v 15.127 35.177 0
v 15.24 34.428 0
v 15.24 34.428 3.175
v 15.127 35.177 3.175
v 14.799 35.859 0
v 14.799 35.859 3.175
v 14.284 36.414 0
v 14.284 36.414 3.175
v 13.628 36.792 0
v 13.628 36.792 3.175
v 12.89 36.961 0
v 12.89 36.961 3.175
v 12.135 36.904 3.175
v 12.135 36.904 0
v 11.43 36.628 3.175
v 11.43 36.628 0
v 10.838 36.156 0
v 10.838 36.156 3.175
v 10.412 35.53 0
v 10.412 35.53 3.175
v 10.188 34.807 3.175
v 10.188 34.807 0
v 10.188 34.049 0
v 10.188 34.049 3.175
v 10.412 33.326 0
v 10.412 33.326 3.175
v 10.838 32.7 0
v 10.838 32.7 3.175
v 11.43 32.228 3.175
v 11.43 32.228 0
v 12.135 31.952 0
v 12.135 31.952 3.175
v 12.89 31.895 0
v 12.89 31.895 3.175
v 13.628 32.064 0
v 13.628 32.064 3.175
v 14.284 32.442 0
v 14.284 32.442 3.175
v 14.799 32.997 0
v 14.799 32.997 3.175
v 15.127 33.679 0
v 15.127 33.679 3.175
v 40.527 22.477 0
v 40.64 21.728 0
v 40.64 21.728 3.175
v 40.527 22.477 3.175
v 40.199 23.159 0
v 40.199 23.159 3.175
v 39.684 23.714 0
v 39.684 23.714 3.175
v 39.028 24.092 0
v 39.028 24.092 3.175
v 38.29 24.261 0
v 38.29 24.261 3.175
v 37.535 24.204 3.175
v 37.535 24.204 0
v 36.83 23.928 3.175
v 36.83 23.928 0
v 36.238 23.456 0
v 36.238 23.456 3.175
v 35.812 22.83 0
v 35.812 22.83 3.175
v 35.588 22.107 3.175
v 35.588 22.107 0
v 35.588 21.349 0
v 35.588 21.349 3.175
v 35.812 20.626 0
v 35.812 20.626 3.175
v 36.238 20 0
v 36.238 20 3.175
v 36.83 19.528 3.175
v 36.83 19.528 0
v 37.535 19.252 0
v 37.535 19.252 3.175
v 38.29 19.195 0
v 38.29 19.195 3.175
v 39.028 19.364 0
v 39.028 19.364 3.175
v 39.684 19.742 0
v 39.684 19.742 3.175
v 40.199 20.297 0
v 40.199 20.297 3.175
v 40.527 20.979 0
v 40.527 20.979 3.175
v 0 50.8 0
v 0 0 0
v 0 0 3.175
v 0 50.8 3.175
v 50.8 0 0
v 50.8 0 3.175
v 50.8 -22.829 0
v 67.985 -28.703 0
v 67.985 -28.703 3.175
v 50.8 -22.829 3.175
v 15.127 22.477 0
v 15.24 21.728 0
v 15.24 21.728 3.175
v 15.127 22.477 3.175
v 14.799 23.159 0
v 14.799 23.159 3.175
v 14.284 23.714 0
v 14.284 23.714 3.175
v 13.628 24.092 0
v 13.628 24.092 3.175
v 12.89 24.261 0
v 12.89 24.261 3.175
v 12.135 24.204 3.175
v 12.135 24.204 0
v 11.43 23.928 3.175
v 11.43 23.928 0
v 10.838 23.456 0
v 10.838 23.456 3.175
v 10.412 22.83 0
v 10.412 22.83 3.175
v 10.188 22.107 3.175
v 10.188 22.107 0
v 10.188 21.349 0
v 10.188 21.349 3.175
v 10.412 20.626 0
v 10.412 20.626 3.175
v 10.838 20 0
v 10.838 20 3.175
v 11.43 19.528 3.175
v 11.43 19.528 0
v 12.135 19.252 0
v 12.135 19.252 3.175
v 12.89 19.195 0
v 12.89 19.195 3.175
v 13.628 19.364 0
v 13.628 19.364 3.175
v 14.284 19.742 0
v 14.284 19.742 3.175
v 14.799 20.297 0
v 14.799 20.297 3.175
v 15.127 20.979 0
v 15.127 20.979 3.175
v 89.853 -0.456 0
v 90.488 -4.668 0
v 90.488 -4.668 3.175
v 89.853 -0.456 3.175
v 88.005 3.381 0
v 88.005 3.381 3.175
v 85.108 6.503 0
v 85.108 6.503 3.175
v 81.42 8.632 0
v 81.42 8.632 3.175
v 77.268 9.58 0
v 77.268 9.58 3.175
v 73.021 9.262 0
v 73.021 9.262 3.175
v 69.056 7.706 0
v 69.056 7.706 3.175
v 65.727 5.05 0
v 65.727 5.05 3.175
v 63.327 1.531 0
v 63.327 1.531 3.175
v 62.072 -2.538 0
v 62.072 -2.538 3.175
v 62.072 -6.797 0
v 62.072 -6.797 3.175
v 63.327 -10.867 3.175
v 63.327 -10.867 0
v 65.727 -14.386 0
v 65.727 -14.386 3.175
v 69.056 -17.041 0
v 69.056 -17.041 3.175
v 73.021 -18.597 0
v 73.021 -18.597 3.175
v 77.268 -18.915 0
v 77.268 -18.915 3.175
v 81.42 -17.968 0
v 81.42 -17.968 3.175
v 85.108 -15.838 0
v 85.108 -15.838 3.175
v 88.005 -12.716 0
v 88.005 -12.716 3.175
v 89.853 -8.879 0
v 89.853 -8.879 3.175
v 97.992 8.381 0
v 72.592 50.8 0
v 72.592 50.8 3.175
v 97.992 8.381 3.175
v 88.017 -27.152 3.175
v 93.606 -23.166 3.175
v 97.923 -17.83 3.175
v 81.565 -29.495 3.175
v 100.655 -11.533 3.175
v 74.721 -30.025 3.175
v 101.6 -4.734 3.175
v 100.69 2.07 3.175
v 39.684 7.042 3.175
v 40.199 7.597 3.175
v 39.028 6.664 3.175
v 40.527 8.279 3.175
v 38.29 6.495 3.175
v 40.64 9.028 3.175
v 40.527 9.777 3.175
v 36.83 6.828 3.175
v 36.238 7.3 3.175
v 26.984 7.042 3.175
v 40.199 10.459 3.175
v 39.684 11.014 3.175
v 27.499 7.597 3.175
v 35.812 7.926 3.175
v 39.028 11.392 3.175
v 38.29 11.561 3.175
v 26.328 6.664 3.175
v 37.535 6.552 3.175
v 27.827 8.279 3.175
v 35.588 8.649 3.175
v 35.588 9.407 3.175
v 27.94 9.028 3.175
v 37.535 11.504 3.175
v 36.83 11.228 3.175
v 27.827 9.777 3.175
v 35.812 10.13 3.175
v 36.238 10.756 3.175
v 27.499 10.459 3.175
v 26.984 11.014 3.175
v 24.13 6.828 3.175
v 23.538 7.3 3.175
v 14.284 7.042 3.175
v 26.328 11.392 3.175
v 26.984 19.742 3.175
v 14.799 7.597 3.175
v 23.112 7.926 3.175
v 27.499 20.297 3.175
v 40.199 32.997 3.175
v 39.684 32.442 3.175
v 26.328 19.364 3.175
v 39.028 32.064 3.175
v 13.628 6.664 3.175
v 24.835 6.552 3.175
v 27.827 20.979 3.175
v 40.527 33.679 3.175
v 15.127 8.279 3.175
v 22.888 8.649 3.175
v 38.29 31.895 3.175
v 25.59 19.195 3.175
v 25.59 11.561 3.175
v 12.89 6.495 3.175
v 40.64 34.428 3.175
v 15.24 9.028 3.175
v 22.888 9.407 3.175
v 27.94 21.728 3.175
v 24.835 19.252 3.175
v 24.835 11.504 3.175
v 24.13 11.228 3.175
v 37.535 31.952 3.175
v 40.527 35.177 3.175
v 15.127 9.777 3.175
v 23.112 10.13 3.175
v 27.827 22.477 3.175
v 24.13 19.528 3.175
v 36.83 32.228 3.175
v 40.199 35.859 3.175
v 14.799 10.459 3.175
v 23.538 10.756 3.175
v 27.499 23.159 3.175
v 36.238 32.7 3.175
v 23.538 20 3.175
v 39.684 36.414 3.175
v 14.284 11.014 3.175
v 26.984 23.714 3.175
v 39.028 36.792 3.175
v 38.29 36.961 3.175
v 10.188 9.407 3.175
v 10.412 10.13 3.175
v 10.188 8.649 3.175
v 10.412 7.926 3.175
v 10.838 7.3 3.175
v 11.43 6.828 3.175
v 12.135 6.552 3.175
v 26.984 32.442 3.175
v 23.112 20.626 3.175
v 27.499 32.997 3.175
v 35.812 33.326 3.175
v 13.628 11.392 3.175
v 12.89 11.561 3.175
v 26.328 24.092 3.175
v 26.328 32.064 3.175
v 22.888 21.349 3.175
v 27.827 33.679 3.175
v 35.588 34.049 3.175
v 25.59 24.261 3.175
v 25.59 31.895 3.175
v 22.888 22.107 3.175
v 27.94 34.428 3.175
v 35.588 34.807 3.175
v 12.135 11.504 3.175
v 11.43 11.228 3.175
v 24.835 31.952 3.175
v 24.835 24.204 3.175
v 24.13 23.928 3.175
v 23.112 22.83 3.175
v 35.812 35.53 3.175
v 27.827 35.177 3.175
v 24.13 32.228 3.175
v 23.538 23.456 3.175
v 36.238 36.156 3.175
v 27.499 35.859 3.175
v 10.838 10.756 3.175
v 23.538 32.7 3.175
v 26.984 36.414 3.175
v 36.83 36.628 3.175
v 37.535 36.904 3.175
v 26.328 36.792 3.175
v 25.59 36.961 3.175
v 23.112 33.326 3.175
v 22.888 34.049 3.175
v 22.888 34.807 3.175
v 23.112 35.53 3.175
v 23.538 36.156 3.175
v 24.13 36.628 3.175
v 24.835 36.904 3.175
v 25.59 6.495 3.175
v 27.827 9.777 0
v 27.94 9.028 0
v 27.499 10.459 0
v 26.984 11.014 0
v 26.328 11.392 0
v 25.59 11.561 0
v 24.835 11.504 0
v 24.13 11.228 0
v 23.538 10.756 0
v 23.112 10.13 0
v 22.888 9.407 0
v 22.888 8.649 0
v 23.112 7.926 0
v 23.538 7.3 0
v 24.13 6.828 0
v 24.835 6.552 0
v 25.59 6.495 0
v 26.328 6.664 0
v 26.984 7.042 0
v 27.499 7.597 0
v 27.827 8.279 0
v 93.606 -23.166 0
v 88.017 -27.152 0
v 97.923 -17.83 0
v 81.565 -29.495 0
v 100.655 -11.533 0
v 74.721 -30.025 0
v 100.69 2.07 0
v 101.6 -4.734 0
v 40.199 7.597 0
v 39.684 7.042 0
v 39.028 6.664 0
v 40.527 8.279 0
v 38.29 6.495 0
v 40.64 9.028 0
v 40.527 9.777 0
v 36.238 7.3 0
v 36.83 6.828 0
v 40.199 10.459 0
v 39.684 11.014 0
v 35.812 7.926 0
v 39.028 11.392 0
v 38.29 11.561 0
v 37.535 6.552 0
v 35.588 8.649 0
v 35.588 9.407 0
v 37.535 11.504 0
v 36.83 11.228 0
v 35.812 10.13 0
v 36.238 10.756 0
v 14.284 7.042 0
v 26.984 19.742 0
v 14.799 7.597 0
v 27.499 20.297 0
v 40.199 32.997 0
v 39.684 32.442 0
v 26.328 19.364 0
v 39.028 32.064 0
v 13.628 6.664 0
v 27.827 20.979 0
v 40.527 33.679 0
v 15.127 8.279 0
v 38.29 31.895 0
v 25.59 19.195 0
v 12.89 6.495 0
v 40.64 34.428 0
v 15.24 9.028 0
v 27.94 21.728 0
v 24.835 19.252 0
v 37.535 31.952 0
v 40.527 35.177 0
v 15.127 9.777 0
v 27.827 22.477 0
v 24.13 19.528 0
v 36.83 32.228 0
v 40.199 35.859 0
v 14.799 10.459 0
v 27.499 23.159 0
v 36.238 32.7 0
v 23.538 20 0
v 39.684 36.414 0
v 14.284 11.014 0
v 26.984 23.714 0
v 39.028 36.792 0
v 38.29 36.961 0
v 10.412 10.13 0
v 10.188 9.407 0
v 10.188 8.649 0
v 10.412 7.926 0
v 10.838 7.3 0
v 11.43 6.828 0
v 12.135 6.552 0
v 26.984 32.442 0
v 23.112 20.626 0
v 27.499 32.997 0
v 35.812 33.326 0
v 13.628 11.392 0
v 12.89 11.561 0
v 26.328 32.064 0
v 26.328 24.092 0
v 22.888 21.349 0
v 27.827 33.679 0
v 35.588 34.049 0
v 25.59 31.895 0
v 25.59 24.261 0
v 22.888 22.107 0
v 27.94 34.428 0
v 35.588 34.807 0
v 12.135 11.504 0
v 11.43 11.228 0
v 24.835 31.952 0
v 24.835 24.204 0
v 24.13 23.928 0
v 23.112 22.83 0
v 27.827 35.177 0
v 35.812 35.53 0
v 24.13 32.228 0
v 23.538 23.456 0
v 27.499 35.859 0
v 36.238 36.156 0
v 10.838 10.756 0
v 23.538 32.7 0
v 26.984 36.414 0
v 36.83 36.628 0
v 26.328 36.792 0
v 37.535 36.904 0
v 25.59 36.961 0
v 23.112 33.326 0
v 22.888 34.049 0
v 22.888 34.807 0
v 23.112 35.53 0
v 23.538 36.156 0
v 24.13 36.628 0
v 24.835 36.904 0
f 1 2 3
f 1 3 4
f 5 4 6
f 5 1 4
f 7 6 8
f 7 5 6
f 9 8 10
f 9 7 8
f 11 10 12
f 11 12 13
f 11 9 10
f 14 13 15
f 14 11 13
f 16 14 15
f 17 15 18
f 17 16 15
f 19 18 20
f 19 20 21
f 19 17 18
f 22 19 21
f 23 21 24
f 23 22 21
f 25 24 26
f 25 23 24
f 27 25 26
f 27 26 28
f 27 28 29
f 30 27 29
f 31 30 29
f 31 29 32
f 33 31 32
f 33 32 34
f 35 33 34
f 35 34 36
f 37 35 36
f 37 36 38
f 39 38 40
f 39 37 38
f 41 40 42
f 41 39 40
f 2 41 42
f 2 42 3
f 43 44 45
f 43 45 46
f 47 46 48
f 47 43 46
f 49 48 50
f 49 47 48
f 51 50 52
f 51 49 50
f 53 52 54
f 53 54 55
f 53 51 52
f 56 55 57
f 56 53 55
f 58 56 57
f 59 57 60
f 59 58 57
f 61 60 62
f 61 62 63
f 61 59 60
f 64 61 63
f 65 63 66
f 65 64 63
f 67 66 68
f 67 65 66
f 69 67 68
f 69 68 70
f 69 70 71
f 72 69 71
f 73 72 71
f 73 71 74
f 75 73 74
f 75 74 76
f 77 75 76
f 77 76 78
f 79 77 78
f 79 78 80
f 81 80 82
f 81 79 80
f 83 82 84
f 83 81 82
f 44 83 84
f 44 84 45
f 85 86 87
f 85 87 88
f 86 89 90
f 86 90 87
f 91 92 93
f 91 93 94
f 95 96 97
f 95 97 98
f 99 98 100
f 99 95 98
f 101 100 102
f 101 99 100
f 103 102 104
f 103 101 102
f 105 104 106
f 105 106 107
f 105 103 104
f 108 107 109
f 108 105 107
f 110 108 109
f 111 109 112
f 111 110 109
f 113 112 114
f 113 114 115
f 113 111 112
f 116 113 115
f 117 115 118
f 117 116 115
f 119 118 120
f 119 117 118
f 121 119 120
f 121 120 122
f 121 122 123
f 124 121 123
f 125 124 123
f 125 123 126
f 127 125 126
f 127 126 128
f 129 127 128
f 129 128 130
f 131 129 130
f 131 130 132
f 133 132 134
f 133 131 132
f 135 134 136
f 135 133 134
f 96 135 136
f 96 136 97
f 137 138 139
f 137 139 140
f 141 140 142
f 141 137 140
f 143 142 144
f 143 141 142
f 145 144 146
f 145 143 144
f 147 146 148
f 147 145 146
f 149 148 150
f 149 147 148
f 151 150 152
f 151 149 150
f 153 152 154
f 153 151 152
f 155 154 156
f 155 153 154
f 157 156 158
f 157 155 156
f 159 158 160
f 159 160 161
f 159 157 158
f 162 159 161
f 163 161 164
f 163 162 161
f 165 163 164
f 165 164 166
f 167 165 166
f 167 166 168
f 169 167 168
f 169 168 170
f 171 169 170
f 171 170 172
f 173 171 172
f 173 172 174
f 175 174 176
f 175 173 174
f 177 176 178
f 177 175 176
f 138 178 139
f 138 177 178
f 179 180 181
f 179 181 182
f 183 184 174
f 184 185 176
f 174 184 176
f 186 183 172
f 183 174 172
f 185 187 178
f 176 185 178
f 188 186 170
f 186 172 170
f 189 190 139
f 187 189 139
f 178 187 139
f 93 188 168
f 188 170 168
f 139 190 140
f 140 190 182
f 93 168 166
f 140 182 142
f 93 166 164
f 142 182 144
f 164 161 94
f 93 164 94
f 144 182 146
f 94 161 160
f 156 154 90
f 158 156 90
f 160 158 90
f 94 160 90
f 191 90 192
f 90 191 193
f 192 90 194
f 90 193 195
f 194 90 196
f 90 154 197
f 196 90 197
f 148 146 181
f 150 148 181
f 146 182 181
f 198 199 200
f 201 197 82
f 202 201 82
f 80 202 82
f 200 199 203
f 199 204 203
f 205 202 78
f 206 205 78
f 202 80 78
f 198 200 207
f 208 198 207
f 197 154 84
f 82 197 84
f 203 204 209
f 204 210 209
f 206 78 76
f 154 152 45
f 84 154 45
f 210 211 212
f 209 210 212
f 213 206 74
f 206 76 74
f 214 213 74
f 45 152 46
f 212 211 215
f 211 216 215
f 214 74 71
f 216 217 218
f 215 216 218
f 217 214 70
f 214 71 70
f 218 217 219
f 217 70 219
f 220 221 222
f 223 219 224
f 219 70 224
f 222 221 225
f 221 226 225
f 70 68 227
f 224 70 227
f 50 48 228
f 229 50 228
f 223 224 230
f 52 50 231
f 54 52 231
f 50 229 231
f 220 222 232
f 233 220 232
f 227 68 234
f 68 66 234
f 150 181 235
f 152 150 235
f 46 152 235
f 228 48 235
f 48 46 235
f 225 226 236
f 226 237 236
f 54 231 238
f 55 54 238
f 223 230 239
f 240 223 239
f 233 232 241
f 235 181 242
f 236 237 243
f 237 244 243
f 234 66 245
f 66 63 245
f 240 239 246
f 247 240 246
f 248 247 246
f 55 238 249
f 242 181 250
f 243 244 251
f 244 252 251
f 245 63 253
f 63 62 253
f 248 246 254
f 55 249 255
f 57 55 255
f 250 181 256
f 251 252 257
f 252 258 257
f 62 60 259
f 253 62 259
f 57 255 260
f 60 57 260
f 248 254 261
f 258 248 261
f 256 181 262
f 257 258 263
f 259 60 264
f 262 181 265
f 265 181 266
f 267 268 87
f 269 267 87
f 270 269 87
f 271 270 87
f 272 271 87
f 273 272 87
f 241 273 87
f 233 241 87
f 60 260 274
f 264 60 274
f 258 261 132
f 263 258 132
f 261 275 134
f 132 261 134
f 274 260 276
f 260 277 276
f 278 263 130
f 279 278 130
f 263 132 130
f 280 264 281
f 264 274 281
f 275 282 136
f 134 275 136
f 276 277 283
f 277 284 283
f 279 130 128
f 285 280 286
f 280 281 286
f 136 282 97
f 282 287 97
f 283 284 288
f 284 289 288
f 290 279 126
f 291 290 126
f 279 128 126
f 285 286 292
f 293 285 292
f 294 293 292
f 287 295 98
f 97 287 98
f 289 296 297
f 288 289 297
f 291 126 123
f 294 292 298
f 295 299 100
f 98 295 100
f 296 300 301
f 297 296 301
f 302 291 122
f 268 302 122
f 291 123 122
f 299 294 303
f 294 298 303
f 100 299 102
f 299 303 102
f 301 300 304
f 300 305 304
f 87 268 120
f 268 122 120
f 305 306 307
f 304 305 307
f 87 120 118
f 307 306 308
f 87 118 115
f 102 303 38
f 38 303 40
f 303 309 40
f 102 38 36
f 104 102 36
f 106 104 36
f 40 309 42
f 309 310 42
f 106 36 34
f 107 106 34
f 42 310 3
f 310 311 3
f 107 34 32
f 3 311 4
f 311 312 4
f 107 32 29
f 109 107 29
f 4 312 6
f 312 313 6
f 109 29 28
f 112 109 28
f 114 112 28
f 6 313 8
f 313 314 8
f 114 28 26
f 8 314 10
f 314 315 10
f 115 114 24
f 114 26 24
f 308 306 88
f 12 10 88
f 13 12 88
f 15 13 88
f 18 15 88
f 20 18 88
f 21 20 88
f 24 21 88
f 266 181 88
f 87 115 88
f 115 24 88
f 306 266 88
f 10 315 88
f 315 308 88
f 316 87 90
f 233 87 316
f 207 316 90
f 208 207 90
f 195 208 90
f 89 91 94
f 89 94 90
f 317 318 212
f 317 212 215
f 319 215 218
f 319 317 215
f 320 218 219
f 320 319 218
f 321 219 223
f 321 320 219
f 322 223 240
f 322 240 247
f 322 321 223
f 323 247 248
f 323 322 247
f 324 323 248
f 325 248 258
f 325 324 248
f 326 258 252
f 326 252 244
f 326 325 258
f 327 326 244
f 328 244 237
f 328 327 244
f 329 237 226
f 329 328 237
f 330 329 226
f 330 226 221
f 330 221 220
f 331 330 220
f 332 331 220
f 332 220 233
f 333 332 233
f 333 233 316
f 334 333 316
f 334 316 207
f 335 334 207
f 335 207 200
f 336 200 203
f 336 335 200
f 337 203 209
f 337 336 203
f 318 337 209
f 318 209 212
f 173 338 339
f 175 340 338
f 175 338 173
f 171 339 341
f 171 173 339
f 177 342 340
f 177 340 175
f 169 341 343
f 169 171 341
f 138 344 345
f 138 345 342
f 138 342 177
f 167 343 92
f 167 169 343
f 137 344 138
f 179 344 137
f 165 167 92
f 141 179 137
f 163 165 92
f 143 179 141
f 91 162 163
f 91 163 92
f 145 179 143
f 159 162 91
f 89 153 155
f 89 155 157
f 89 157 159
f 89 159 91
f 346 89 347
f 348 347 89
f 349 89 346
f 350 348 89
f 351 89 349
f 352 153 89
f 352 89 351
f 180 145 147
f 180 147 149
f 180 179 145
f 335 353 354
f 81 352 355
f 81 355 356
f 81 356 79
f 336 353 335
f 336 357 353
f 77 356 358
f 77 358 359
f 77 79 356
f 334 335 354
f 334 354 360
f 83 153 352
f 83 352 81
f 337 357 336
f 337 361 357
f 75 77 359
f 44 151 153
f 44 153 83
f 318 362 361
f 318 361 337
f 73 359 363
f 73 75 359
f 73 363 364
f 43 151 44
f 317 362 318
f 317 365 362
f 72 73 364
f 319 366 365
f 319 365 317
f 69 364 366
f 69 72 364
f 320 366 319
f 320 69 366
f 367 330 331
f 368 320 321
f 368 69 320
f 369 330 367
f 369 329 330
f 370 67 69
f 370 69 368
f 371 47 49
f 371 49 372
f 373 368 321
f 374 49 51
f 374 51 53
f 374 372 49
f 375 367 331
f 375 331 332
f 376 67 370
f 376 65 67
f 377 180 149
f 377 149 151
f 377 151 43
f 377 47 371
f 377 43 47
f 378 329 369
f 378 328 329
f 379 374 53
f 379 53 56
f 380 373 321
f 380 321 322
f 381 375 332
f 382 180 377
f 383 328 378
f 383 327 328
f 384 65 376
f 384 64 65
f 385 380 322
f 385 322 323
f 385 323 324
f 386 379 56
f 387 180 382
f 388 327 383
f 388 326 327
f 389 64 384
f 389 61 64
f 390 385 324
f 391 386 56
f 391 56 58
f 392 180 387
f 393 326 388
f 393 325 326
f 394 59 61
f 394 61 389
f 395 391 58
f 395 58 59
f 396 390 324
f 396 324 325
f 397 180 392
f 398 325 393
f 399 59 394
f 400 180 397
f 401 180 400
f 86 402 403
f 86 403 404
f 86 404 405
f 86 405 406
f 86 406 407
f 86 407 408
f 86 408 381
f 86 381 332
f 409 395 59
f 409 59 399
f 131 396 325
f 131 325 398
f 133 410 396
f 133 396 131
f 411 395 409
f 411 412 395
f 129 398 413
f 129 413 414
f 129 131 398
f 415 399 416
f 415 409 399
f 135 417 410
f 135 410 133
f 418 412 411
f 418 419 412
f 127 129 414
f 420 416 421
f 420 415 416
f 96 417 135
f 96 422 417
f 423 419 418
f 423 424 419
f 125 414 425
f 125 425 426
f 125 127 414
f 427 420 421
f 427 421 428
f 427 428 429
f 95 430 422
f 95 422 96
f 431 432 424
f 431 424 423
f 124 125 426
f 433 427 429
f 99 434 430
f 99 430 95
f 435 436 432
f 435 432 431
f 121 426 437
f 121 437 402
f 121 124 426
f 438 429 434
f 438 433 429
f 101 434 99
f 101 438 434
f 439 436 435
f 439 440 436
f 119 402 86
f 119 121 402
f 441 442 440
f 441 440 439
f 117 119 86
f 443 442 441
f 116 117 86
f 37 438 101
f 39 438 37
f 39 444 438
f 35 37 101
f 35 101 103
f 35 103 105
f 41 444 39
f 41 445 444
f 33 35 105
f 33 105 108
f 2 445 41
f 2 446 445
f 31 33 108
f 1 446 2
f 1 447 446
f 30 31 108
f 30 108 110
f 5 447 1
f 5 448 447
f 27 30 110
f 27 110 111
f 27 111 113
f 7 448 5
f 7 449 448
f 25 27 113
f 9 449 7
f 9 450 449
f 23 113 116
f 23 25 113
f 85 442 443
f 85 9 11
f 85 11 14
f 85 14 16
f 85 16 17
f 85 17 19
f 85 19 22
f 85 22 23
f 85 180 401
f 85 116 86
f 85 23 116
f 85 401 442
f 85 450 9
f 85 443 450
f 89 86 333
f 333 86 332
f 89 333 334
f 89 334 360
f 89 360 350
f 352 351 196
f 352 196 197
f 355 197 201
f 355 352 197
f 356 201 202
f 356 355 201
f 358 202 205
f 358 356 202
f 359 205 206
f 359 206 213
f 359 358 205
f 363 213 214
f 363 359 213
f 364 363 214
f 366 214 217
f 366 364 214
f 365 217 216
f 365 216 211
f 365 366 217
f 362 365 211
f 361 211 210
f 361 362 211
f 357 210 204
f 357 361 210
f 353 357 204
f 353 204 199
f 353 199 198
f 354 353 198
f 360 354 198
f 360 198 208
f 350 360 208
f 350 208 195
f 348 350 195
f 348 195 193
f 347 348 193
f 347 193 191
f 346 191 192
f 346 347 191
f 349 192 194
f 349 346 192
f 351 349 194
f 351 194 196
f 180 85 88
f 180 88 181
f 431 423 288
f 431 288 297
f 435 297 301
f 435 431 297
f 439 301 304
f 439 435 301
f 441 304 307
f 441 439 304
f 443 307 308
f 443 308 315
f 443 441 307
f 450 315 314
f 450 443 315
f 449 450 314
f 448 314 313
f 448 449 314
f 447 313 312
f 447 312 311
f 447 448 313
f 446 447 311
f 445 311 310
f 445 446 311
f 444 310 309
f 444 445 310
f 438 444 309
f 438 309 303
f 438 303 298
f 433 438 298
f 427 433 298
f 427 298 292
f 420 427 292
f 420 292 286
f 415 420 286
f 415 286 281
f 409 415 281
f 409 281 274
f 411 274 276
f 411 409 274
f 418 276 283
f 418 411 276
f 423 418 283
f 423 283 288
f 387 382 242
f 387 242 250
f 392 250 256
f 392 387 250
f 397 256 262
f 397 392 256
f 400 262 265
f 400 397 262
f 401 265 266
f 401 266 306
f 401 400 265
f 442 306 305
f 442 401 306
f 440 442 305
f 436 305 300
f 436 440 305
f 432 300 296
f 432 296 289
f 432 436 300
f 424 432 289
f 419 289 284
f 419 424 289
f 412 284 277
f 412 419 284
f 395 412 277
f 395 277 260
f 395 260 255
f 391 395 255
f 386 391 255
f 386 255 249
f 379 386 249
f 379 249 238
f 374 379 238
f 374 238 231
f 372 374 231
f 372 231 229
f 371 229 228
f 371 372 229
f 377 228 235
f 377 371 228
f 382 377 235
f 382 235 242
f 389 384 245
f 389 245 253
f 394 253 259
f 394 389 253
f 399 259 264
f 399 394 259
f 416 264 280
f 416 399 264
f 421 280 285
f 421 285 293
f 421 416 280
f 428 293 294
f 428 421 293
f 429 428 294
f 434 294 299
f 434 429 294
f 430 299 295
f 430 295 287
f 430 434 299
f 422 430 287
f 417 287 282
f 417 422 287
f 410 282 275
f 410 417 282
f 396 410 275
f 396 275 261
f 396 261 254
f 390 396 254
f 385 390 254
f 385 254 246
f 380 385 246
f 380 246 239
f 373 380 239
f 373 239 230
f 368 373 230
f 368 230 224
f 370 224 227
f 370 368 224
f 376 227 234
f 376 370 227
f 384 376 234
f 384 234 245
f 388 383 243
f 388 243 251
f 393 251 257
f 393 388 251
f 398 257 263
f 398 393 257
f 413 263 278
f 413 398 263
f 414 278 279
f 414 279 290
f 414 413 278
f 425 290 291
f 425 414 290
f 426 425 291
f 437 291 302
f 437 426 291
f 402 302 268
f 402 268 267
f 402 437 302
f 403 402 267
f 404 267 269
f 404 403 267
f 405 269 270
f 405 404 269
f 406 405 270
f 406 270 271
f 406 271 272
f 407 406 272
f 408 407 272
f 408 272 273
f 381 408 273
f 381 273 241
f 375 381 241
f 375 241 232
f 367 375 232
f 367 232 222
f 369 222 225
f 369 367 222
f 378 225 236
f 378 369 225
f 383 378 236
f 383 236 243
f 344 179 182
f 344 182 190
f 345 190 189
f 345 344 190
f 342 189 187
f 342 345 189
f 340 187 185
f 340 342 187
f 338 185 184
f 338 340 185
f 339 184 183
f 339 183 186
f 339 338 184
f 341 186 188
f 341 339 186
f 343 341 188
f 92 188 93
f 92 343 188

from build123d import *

# Parameters (mm, degrees)
SKETCH1_R           = 2.54
SKETCH1_R_2         = 14.2875
BOSS_EXTRUDE1_DEPTH = 3.175


with BuildPart() as part:
    # Sketch1 → Boss-Extrude1 (new body)
    with BuildSketch(Plane.XY):
        with BuildLine():
            Line((0, 0), (0, 50.8))
            Line((0, 50.8), (72.591943157, 50.8))
            Line((72.591943157, 50.8), (97.991943157, 8.381133577))
            ThreePointArc((97.991943157, 8.381133577), (95.945608162, -20.644868853), (67.98549449, -28.702681675))
            Line((67.98549449, -28.702681675), (50.8, -22.829153204))
            Line((50.8, -22.829153204), (50.8, 0))
            Line((50.8, 0), (0, 0))
        make_face()
        with Locations((12.7, 34.42794066)):
            Circle(SKETCH1_R, mode=Mode.SUBTRACT)
        with Locations((25.4, 34.42794066)):
            Circle(SKETCH1_R, mode=Mode.SUBTRACT)
        with Locations((38.1, 34.42794066)):
            Circle(SKETCH1_R, mode=Mode.SUBTRACT)
        with Locations((25.4, 21.72794066)):
            Circle(SKETCH1_R, mode=Mode.SUBTRACT)
        with Locations((38.1, 21.72794066)):
            Circle(SKETCH1_R, mode=Mode.SUBTRACT)
        with Locations((25.4, 9.02794066)):
            Circle(SKETCH1_R, mode=Mode.SUBTRACT)
        with Locations((38.1, 9.02794066)):
            Circle(SKETCH1_R, mode=Mode.SUBTRACT)
        with Locations((12.7, 21.72794066)):
            Circle(SKETCH1_R, mode=Mode.SUBTRACT)
        with Locations((12.7, 9.02794066)):
            Circle(SKETCH1_R, mode=Mode.SUBTRACT)
        with Locations((76.2, -4.667667649)):
            Circle(SKETCH1_R_2, mode=Mode.SUBTRACT)
    extrude(amount=BOSS_EXTRUDE1_DEPTH)


solid = part.part
